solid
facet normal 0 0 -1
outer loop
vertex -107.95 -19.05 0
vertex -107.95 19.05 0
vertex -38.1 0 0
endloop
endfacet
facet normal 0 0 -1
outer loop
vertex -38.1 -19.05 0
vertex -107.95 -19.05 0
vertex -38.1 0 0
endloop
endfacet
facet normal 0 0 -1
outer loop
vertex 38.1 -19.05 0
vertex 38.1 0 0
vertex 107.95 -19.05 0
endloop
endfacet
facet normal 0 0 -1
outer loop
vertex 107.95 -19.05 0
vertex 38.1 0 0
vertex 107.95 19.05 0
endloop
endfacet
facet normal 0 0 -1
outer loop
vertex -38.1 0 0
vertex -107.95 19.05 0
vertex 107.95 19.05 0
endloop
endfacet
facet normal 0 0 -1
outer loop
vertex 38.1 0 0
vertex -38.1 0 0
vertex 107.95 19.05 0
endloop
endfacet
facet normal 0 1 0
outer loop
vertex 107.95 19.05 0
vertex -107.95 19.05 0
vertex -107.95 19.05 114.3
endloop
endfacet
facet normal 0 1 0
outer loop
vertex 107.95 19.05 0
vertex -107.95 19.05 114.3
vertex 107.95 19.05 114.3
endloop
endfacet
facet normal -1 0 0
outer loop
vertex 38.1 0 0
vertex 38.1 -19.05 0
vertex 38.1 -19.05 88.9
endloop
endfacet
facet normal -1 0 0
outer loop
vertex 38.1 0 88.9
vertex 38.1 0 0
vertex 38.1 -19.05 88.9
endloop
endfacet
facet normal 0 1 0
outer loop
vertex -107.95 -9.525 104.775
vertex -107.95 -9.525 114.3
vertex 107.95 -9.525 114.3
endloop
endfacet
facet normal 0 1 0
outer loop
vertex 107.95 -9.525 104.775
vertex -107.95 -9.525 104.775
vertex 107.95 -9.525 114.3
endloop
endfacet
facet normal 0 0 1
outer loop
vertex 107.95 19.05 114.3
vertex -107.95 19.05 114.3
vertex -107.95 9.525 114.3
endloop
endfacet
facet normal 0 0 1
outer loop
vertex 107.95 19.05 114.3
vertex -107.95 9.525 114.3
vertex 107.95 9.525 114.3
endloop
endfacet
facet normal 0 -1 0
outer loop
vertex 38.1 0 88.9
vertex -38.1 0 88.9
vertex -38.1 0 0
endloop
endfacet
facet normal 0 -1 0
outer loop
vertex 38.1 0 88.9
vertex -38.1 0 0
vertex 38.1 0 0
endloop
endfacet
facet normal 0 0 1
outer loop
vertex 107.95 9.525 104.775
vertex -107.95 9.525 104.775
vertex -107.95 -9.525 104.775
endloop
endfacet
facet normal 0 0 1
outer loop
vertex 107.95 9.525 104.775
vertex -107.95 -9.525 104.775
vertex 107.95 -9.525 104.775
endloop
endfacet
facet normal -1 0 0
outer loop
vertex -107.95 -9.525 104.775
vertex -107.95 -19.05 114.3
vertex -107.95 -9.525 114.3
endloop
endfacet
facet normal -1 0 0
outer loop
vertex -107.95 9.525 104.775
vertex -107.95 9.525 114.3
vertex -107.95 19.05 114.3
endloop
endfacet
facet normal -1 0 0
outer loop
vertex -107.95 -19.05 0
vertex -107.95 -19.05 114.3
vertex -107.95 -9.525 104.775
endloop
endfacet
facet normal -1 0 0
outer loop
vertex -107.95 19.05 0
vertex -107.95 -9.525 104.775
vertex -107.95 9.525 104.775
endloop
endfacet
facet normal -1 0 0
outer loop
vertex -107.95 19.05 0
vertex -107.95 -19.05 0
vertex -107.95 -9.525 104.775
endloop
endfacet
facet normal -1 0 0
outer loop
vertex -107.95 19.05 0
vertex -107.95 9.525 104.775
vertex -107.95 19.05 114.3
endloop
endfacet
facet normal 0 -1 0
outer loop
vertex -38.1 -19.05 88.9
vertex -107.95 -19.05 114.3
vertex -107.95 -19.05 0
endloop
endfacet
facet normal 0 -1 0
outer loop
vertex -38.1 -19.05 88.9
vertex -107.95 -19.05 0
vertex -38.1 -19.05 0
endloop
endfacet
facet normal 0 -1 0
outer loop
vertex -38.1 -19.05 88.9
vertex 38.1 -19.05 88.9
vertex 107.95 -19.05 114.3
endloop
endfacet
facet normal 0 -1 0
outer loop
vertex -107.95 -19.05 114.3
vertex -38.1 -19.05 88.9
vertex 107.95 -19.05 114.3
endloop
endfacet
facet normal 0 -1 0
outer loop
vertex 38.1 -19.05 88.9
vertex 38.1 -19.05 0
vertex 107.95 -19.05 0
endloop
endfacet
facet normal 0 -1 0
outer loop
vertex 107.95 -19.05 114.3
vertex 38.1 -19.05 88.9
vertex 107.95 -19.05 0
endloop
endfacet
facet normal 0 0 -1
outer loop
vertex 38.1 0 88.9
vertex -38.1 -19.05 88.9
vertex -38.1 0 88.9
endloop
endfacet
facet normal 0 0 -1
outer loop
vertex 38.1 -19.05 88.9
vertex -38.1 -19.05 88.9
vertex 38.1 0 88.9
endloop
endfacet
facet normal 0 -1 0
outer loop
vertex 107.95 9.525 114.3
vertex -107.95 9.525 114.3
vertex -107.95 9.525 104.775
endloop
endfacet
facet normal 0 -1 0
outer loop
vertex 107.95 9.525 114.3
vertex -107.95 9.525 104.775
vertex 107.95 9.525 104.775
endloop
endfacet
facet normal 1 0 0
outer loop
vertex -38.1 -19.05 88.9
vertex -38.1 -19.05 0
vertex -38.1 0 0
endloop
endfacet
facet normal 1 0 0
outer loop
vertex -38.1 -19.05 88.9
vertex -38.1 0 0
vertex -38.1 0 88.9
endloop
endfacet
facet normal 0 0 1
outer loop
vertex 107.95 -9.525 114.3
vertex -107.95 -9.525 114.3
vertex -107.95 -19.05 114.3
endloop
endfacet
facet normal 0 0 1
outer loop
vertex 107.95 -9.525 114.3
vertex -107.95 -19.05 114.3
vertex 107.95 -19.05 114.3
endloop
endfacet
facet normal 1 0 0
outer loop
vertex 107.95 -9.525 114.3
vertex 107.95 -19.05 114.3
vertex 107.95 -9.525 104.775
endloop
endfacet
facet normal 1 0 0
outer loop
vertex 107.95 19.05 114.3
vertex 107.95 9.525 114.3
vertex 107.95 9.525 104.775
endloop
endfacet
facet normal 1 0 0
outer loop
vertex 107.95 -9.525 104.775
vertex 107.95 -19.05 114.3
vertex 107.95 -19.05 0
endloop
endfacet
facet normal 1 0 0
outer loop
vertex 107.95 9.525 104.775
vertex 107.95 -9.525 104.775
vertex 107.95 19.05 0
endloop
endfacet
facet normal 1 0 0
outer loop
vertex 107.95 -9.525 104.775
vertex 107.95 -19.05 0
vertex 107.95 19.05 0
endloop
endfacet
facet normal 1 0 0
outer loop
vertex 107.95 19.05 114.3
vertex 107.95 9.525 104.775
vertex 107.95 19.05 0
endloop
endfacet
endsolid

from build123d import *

# Parameters (mm, degrees)
SKETCH_W        = 215.9
SKETCH_H        = 38.1
PAD_DEPTH       = 114.3
SKETCH001_W     = 762
SKETCH001_H     = 19.05
POCKET_DEPTH    = 9.525
SKETCH003_W     = 76.2
SKETCH003_H     = 88.9
POCKET002_DEPTH = 19.05


with BuildPart() as part:
    # Sketch → Pad (new body)
    with BuildSketch(Plane.XY):
        Rectangle(SKETCH_W, SKETCH_H)
    extrude(amount=PAD_DEPTH)

    # Sketch001 (on Face6 of Pad) → Pocket (cut)
    with BuildSketch(Plane.XY.offset(114.3)):
        Rectangle(SKETCH001_W, SKETCH001_H)
    extrude(amount=-POCKET_DEPTH, mode=Mode.SUBTRACT)

    # Sketch003 → Pocket002 (cut)
    with BuildSketch(Plane.XZ.offset(19.05)):
        with Locations((0, 44.45)):
            Rectangle(SKETCH003_W, SKETCH003_H)
    extrude(amount=-POCKET002_DEPTH, mode=Mode.SUBTRACT)


solid = part.part
